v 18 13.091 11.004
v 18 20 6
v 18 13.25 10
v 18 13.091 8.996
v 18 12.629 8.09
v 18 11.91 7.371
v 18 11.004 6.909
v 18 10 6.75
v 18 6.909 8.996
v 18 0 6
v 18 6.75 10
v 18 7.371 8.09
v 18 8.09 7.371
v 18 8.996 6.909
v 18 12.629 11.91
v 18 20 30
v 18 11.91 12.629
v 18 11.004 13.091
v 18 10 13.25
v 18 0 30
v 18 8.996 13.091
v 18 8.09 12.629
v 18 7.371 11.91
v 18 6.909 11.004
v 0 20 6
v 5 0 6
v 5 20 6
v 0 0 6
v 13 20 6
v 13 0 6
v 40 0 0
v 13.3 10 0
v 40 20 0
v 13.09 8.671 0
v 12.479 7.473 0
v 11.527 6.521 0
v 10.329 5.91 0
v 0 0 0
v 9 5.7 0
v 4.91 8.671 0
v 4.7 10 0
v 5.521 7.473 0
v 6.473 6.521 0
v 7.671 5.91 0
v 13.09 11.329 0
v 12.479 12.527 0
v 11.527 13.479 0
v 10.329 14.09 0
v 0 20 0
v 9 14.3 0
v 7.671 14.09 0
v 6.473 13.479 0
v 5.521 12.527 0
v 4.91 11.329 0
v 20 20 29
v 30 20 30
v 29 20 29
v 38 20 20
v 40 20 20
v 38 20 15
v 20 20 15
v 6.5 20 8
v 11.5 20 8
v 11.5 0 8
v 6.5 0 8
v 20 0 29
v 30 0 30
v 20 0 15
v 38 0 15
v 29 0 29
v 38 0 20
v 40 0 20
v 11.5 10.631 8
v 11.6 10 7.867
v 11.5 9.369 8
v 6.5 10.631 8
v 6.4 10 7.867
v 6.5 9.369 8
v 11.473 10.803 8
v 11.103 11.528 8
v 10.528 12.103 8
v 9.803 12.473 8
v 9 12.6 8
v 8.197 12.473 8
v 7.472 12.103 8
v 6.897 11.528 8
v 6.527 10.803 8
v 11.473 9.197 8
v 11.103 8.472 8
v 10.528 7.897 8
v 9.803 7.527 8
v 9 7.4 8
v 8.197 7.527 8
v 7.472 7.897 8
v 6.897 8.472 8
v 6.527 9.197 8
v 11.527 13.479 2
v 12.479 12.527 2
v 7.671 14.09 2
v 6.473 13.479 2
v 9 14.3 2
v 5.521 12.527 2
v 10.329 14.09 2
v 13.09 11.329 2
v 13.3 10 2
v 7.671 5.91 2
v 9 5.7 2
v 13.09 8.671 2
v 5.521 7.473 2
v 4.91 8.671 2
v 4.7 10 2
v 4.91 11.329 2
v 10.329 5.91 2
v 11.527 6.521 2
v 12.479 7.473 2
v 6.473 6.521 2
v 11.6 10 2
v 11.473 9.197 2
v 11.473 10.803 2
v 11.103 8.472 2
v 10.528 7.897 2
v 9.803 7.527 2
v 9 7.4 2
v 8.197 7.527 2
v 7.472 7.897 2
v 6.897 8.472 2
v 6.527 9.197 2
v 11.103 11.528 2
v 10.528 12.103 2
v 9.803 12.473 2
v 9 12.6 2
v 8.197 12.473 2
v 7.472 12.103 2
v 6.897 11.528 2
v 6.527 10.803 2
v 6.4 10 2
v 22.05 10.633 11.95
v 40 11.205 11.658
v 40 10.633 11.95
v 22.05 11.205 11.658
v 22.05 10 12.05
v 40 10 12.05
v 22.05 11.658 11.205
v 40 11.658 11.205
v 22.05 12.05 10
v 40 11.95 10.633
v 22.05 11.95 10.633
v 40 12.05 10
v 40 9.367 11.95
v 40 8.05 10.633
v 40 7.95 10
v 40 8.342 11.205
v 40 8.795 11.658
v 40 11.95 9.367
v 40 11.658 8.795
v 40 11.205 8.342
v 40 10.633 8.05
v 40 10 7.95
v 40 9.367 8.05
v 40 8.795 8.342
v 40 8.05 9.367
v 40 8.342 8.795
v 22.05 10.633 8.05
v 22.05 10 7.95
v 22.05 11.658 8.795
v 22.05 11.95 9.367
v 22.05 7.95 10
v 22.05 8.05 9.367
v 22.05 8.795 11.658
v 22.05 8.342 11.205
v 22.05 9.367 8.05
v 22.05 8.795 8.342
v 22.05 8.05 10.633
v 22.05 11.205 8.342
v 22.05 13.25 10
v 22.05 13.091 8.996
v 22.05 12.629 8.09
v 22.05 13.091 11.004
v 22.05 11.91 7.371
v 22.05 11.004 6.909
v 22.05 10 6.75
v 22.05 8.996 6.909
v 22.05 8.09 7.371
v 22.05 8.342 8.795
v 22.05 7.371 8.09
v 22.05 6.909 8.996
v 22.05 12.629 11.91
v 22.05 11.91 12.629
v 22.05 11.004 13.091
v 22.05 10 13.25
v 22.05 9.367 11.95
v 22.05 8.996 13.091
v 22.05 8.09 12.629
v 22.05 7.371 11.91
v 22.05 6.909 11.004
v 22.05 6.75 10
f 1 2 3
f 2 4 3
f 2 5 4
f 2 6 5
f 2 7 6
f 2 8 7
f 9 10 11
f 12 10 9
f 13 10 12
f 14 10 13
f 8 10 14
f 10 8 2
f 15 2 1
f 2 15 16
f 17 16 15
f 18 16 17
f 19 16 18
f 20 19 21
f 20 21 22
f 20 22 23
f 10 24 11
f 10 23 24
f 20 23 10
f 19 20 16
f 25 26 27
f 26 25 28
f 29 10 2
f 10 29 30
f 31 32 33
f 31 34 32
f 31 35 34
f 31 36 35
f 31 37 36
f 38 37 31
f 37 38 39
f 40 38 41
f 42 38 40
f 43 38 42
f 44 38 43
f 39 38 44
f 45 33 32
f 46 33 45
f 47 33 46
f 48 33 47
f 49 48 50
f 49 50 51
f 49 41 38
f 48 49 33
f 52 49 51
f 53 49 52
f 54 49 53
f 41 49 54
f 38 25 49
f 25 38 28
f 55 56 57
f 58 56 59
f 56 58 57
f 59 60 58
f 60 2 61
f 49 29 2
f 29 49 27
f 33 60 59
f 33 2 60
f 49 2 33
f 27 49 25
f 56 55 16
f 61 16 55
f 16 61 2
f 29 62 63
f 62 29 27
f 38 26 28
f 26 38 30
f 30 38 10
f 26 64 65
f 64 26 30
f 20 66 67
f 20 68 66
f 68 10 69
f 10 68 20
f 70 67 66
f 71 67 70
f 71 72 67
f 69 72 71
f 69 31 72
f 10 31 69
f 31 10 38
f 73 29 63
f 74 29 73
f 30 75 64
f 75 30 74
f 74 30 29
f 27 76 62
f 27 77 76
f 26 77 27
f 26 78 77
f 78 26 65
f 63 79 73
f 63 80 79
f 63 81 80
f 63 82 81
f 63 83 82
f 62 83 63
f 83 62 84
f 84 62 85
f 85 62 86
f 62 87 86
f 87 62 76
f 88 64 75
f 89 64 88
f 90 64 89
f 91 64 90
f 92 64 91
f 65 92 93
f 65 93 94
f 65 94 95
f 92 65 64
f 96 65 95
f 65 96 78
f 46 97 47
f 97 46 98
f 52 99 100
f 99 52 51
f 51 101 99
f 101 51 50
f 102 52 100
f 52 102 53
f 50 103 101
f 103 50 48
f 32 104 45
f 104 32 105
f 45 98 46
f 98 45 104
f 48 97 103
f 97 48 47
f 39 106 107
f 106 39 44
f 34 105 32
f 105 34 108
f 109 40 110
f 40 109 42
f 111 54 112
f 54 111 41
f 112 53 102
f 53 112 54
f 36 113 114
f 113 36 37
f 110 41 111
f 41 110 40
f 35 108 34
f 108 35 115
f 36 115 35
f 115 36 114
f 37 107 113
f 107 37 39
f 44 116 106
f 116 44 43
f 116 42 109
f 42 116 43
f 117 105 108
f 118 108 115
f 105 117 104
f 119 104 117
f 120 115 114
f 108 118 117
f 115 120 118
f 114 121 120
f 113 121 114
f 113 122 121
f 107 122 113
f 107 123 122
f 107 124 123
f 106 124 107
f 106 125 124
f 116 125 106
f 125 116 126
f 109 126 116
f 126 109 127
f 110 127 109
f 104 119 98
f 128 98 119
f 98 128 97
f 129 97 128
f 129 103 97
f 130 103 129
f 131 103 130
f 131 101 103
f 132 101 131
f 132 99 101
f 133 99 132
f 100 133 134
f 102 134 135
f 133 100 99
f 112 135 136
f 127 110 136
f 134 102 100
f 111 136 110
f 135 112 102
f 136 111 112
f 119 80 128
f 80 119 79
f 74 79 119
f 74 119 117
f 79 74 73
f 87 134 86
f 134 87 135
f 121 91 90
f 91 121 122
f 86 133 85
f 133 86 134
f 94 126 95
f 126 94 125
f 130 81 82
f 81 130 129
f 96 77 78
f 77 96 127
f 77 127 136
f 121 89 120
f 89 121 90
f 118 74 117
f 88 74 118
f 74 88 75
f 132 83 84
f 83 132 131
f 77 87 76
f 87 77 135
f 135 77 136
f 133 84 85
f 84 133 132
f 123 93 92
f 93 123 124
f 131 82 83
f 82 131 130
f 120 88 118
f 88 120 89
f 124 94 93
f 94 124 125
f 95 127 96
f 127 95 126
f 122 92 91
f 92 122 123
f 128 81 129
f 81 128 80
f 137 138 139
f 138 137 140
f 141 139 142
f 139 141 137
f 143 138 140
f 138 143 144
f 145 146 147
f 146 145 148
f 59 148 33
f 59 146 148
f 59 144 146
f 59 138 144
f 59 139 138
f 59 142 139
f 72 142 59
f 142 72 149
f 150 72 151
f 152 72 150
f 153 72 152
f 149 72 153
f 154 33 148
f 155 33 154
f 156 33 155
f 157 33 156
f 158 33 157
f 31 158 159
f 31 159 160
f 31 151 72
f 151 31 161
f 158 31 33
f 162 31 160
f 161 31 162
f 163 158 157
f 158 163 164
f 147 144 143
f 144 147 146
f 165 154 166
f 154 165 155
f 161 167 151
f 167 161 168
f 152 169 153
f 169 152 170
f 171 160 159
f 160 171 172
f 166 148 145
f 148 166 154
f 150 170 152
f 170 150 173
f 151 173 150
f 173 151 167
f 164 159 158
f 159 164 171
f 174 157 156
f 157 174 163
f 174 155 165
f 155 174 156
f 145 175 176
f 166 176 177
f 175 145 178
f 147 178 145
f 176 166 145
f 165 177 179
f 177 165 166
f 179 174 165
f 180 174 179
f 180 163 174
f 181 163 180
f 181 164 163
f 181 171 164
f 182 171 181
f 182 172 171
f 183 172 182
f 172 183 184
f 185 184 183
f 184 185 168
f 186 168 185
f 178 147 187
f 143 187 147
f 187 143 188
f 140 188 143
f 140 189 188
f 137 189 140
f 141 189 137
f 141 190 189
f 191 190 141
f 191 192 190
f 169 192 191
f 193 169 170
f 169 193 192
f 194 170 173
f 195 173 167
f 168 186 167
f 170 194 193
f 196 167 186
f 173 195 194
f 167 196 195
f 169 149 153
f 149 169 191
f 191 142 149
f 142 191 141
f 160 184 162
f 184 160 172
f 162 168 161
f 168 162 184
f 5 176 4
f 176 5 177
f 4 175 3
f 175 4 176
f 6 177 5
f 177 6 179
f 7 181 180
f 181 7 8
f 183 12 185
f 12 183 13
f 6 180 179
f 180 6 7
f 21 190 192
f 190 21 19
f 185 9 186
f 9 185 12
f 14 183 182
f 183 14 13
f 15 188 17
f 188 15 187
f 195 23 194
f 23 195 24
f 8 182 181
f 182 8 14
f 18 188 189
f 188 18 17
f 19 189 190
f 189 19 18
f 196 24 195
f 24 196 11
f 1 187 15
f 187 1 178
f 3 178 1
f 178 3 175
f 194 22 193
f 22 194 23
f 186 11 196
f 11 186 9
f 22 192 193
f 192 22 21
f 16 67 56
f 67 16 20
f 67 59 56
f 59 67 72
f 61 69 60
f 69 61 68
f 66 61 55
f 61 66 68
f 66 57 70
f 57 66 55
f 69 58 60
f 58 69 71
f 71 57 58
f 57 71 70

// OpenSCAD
// file: ../libs/hardware-recess.scad
/*
 * A library to make capture holes in material for M3 & M5 hardware and some
 * common mounting patterns.
 * Copyright 2021 Alex Volkov <alex@flamy.ca>
 *
 * Project URL
 * https://github.com/avolkov/openscad-designs
 *
 * License: Attribution-ShareAlike 4.0 International (CC BY-SA)
 * https://creativecommons.org/licenses/by-sa/4.0/
 *
 * Version 0.2 2021-05-26 Refactoring variables into M_DIM list
 * Version 0.1 2021-04-05 Initial publication
 */

 // Common mounting patterns
ear_thick=8;
stacked_len = ear_thick*3;
screw_mount_space = 20;
screw_mount_offset =7;
total_len = stacked_len + screw_mount_space*2;
mounting_diff = 8;


// Dimensional info for metric capscrew hardware
//             [0,      1,            2,     3,          4,     5        ]
// List values [bolt_d, bolt_head_d, bolt_h, nut_trap_d, nut_h, locknut_h]
M_DIM = [
    [], // spacing
    [], // M1
    [], // M2
    [3.2, 5.6, 3.2, 6.7, 2.4, 3], // M3
    [4.1, 6.5, 4.05, 9.0, 3.9, 4], // M4
    [5.2, 8.6, 4.90, 9.7, 4, 5]  // M5
];



module hole_w_end(hole_len, trap_height, type, bolt_d, flip=false){
    /*
    Make a hole with an end for bolt or a nut.
    This is a more generic functions replacing m5_ hole-making functions.

    :bolt_d: bolt diameter, i.e. 3, 5 mm
    :type: type of the head hole: 'none', 'hex', 'round'
    */
    if (type != "none"){
        cylinder(h=hole_len-trap_height, d=M_DIM[bolt_d][0], $fn=20);
        if (flip){
            m_recess(trap_height, type, M_DIM[bolt_d][0]);
            translate([0,0,trap_height])
                cylinder(h=hole_len-trap_height, d=M_DIM[bolt_d][0], $fn=20);

        } else {
                translate([0,0, hole_len - trap_height])
                    m_recess(trap_height, type, M_DIM[bolt_d][0]);
        }
    } else {
        cylinder(h=hole_len, d=bolt_d);
    }
}

module bolt_nut(hole_len, bolt_d, flip=false){
    /*
    Create a model for a hole with bolt end on one end and nut hole on the other end.
    Note, this functions doesn't subtract the model it only makes the model

    :hole_len: total length of the hole
    :bolt_d: diameter of a blot
    :flip: flip the side with bolt recess
    */
    // currently only implemented for 3mm
    if (flip){
        hole_w_end(hole_len, M_DIM[bolt_d][4], "hex", M_DIM[bolt_d][0]);
        translate([0,0, hole_len]){
            rotate([180, 0, 0]){
                hole_w_end(hole_len, M_DIM[bolt_d][2], "round", M_DIM[bolt_d][0]);
            }
        }
    } else {
        hole_w_end(hole_len, M_DIM[bolt_d][2], "round", M_DIM[bolt_d][0]);
        translate([0,0, hole_len]){
            rotate([180, 0, 0]){
                hole_w_end(hole_len, M_DIM[bolt_d][4], "hex", M_DIM[bolt_d][0]);
            }
        }
    }
}




module m_recess(length, end_type, bolt_d) {
    /*
    Create nut or bolt capture hole

    :height: length of a mounting hole, including end-mounting hardware
    :end_type: type of the head hole: 'none', 'hex', 'round
    :bolt_d: bolt diameter, i.e. 3, 5 mm
    */
    make_recess(length, end_type, M_DIM[bolt_d][1]);

}

module make_recess(height, end_type, trap_d){
    /*
    Make recess to capture
    */
    rotate([0, 0,90]){
        if (end_type == "hex"){
            cylinder(h=height, d=trap_d, $fn=6);
        } else if (end_type == "round"){
            cylinder(h=height, d=trap_d, $fn=20);
        }
    }
}


//Functions specific to M5 size,
// TODO rewrite as hole_w_end m_recess
module m5_recess(height, end_type) {
    // nut/bolt capture hole
    m_recess(height, end_type, 5);
}



module m5_hole_w_end(hole_len, trap_height, type){
    //Given hole lenght and trap height create a nut trap hole
    hole_w_end(hole_len, trap_height, type, 5);
}
module m5_hole_w_ends(hole_len, nut_extra=0){
    m5_hole_w_end(hole_len, M_DIM[5][2], "round");
    rotate([0, 180, 0])
        translate([0, 0, - hole_len])
            m5_hole_w_end(hole_len,M_DIM[5][4] + nut_extra, "hex");
}

module m3_hole_w_ends(hole_len, nut_extra=0){
    hole_w_end(hole_len, m3_nut_thick, "round", m3_bolt_thick);
    hole_w_end(hole_len, m3_nut_thick, "hex", m3_bolt_thick, flip=true);
}

module set_mounting_hole(x_offset, y_offset, thickness, nut_height, end_type){
    /*
    Make a hole in an existing material
    end_type: one of hex, round, none
    */
    translate([x_offset, y_offset, 0]){
        m5_hole_w_end(thickness, nut_height, end_type);
    }
}


module m5_thread(height){
    // TODO: Rewrite this with actual threads
    cylinder(h=height, d=M_DIM[5][0], center=true, $fn=16);
}

module m3_thread(height){
    // TODO: Rewrite this with actual threads
    cylinder(h=height, d=M_DIM[3][0], center=true, $fn=16);
}

module m3_square_nut(depth, height){
    translate([0,0,1])
        cylinder(h=height, d=M_DIM[3][0], center=true, $fn=16);

    m_recess(M_DIM[3][4], "hex", 3);
    m_recess(m3_nut_thick, "hex", 3);
    translate([0,0,-1])
        cylinder(h=depth, d=M_DIM[3][0], center=true, $fn=16);
}



//Mounting Patterns
module mounting_holes_2(fastener_len, nut_height, end_type){
    /* Two-hole mounting pattern for M5 bolts*/
    width_offsetn = 16;
    set_mounting_hole(
        screw_mount_offset,
        width_offset + mounting_diff,
        fastener_len,
        nut_height,
        end_type);

    set_mounting_hole(
        total_len - screw_mount_offset,
        width_offset + mounting_diff,
        fastener_len,
        nut_height,
        end_type);


 }

module mounting_holes(fastener_len, nut_height, end_type){
    /*Four-hole mounting pattern for M5 bolts*/
    width_offset = 16;
    set_mounting_hole(
        screw_mount_offset,
        width_offset + mounting_diff,
        fastener_len,
        nut_height,
        end_type);

    set_mounting_hole(
        screw_mount_offset,
        width_offset - mounting_diff,
        fastener_len,
        nut_height,
        end_type);

    // Side towards the end
    set_mounting_hole(
        total_len - screw_mount_offset,
        width_offset + mounting_diff,
        fastener_len,
        nut_height,
        end_type);

    set_mounting_hole(
        total_len - screw_mount_offset,
        width_offset - mounting_diff,
        fastener_len,
        nut_height,
        end_type);
}


// Aluminium profile connectors

module alu_connector(face_len, thickness){

    face_w = 18;
    flat_gap = 5;
    alu_2020_base = 8;

    union(){
        cube([face_w, face_len, thickness]);
        translate([face_w/2 + alu_2020_base/2, face_len, thickness])
            rotate([0,270,90])
                linear_extrude(face_len)
                    polygon(points=[[0,0], [2,1.5], [2,6.5], [0,alu_2020_base]]);
    }
}
// main file
/*
 *
 * Re-implementation of PSU connector in OpenScad for 25mm M4 bolt
 *
 *Copyright 2021 Alex Volkov <alex@flamy.ca>
 * License: Attribution-ShareAlike 4.0 International (CC BY-SA)
 * https://creativecommons.org/licenses/by-sa/4.0/
 */

include <../libs/hardware-recess.scad>;
$fn=30;


module make_connector(){
    difference(){
        thick = 6;
        part_len = 20;
        alu_connector(part_len, thick);
        translate([18/2, part_len/2, 0])
            hole_w_end(thick+2, 2, "round", 5, flip=true);
    }
}

module make_psu_mount(){
    buff_len = 22;
    buff_w = 20;
    difference(){
        
        cube([buff_len, buff_w, 30]);
        //Mount for M4 bolt
        translate([buff_len, buff_w/2, 10])
            rotate([0,270, 0])
                hole_w_end(buff_len, M_DIM[4][2], "round", 4);
        
        //Shave off angle
        
        translate([buff_len+5, 0, 15])
            rotate([0,-45,0])
                cube([15, buff_w, 25]);
        
        translate([2, buff_w, 15])
            rotate([90,0,0])
                linear_extrude(buff_w)
                    polygon(points=[[0,0], [0,14], [10,14], [9, 14],[18, 5], [18, 0]]);
    }
}





make_connector();
translate([18, 0,0]){
    make_psu_mount();
}
